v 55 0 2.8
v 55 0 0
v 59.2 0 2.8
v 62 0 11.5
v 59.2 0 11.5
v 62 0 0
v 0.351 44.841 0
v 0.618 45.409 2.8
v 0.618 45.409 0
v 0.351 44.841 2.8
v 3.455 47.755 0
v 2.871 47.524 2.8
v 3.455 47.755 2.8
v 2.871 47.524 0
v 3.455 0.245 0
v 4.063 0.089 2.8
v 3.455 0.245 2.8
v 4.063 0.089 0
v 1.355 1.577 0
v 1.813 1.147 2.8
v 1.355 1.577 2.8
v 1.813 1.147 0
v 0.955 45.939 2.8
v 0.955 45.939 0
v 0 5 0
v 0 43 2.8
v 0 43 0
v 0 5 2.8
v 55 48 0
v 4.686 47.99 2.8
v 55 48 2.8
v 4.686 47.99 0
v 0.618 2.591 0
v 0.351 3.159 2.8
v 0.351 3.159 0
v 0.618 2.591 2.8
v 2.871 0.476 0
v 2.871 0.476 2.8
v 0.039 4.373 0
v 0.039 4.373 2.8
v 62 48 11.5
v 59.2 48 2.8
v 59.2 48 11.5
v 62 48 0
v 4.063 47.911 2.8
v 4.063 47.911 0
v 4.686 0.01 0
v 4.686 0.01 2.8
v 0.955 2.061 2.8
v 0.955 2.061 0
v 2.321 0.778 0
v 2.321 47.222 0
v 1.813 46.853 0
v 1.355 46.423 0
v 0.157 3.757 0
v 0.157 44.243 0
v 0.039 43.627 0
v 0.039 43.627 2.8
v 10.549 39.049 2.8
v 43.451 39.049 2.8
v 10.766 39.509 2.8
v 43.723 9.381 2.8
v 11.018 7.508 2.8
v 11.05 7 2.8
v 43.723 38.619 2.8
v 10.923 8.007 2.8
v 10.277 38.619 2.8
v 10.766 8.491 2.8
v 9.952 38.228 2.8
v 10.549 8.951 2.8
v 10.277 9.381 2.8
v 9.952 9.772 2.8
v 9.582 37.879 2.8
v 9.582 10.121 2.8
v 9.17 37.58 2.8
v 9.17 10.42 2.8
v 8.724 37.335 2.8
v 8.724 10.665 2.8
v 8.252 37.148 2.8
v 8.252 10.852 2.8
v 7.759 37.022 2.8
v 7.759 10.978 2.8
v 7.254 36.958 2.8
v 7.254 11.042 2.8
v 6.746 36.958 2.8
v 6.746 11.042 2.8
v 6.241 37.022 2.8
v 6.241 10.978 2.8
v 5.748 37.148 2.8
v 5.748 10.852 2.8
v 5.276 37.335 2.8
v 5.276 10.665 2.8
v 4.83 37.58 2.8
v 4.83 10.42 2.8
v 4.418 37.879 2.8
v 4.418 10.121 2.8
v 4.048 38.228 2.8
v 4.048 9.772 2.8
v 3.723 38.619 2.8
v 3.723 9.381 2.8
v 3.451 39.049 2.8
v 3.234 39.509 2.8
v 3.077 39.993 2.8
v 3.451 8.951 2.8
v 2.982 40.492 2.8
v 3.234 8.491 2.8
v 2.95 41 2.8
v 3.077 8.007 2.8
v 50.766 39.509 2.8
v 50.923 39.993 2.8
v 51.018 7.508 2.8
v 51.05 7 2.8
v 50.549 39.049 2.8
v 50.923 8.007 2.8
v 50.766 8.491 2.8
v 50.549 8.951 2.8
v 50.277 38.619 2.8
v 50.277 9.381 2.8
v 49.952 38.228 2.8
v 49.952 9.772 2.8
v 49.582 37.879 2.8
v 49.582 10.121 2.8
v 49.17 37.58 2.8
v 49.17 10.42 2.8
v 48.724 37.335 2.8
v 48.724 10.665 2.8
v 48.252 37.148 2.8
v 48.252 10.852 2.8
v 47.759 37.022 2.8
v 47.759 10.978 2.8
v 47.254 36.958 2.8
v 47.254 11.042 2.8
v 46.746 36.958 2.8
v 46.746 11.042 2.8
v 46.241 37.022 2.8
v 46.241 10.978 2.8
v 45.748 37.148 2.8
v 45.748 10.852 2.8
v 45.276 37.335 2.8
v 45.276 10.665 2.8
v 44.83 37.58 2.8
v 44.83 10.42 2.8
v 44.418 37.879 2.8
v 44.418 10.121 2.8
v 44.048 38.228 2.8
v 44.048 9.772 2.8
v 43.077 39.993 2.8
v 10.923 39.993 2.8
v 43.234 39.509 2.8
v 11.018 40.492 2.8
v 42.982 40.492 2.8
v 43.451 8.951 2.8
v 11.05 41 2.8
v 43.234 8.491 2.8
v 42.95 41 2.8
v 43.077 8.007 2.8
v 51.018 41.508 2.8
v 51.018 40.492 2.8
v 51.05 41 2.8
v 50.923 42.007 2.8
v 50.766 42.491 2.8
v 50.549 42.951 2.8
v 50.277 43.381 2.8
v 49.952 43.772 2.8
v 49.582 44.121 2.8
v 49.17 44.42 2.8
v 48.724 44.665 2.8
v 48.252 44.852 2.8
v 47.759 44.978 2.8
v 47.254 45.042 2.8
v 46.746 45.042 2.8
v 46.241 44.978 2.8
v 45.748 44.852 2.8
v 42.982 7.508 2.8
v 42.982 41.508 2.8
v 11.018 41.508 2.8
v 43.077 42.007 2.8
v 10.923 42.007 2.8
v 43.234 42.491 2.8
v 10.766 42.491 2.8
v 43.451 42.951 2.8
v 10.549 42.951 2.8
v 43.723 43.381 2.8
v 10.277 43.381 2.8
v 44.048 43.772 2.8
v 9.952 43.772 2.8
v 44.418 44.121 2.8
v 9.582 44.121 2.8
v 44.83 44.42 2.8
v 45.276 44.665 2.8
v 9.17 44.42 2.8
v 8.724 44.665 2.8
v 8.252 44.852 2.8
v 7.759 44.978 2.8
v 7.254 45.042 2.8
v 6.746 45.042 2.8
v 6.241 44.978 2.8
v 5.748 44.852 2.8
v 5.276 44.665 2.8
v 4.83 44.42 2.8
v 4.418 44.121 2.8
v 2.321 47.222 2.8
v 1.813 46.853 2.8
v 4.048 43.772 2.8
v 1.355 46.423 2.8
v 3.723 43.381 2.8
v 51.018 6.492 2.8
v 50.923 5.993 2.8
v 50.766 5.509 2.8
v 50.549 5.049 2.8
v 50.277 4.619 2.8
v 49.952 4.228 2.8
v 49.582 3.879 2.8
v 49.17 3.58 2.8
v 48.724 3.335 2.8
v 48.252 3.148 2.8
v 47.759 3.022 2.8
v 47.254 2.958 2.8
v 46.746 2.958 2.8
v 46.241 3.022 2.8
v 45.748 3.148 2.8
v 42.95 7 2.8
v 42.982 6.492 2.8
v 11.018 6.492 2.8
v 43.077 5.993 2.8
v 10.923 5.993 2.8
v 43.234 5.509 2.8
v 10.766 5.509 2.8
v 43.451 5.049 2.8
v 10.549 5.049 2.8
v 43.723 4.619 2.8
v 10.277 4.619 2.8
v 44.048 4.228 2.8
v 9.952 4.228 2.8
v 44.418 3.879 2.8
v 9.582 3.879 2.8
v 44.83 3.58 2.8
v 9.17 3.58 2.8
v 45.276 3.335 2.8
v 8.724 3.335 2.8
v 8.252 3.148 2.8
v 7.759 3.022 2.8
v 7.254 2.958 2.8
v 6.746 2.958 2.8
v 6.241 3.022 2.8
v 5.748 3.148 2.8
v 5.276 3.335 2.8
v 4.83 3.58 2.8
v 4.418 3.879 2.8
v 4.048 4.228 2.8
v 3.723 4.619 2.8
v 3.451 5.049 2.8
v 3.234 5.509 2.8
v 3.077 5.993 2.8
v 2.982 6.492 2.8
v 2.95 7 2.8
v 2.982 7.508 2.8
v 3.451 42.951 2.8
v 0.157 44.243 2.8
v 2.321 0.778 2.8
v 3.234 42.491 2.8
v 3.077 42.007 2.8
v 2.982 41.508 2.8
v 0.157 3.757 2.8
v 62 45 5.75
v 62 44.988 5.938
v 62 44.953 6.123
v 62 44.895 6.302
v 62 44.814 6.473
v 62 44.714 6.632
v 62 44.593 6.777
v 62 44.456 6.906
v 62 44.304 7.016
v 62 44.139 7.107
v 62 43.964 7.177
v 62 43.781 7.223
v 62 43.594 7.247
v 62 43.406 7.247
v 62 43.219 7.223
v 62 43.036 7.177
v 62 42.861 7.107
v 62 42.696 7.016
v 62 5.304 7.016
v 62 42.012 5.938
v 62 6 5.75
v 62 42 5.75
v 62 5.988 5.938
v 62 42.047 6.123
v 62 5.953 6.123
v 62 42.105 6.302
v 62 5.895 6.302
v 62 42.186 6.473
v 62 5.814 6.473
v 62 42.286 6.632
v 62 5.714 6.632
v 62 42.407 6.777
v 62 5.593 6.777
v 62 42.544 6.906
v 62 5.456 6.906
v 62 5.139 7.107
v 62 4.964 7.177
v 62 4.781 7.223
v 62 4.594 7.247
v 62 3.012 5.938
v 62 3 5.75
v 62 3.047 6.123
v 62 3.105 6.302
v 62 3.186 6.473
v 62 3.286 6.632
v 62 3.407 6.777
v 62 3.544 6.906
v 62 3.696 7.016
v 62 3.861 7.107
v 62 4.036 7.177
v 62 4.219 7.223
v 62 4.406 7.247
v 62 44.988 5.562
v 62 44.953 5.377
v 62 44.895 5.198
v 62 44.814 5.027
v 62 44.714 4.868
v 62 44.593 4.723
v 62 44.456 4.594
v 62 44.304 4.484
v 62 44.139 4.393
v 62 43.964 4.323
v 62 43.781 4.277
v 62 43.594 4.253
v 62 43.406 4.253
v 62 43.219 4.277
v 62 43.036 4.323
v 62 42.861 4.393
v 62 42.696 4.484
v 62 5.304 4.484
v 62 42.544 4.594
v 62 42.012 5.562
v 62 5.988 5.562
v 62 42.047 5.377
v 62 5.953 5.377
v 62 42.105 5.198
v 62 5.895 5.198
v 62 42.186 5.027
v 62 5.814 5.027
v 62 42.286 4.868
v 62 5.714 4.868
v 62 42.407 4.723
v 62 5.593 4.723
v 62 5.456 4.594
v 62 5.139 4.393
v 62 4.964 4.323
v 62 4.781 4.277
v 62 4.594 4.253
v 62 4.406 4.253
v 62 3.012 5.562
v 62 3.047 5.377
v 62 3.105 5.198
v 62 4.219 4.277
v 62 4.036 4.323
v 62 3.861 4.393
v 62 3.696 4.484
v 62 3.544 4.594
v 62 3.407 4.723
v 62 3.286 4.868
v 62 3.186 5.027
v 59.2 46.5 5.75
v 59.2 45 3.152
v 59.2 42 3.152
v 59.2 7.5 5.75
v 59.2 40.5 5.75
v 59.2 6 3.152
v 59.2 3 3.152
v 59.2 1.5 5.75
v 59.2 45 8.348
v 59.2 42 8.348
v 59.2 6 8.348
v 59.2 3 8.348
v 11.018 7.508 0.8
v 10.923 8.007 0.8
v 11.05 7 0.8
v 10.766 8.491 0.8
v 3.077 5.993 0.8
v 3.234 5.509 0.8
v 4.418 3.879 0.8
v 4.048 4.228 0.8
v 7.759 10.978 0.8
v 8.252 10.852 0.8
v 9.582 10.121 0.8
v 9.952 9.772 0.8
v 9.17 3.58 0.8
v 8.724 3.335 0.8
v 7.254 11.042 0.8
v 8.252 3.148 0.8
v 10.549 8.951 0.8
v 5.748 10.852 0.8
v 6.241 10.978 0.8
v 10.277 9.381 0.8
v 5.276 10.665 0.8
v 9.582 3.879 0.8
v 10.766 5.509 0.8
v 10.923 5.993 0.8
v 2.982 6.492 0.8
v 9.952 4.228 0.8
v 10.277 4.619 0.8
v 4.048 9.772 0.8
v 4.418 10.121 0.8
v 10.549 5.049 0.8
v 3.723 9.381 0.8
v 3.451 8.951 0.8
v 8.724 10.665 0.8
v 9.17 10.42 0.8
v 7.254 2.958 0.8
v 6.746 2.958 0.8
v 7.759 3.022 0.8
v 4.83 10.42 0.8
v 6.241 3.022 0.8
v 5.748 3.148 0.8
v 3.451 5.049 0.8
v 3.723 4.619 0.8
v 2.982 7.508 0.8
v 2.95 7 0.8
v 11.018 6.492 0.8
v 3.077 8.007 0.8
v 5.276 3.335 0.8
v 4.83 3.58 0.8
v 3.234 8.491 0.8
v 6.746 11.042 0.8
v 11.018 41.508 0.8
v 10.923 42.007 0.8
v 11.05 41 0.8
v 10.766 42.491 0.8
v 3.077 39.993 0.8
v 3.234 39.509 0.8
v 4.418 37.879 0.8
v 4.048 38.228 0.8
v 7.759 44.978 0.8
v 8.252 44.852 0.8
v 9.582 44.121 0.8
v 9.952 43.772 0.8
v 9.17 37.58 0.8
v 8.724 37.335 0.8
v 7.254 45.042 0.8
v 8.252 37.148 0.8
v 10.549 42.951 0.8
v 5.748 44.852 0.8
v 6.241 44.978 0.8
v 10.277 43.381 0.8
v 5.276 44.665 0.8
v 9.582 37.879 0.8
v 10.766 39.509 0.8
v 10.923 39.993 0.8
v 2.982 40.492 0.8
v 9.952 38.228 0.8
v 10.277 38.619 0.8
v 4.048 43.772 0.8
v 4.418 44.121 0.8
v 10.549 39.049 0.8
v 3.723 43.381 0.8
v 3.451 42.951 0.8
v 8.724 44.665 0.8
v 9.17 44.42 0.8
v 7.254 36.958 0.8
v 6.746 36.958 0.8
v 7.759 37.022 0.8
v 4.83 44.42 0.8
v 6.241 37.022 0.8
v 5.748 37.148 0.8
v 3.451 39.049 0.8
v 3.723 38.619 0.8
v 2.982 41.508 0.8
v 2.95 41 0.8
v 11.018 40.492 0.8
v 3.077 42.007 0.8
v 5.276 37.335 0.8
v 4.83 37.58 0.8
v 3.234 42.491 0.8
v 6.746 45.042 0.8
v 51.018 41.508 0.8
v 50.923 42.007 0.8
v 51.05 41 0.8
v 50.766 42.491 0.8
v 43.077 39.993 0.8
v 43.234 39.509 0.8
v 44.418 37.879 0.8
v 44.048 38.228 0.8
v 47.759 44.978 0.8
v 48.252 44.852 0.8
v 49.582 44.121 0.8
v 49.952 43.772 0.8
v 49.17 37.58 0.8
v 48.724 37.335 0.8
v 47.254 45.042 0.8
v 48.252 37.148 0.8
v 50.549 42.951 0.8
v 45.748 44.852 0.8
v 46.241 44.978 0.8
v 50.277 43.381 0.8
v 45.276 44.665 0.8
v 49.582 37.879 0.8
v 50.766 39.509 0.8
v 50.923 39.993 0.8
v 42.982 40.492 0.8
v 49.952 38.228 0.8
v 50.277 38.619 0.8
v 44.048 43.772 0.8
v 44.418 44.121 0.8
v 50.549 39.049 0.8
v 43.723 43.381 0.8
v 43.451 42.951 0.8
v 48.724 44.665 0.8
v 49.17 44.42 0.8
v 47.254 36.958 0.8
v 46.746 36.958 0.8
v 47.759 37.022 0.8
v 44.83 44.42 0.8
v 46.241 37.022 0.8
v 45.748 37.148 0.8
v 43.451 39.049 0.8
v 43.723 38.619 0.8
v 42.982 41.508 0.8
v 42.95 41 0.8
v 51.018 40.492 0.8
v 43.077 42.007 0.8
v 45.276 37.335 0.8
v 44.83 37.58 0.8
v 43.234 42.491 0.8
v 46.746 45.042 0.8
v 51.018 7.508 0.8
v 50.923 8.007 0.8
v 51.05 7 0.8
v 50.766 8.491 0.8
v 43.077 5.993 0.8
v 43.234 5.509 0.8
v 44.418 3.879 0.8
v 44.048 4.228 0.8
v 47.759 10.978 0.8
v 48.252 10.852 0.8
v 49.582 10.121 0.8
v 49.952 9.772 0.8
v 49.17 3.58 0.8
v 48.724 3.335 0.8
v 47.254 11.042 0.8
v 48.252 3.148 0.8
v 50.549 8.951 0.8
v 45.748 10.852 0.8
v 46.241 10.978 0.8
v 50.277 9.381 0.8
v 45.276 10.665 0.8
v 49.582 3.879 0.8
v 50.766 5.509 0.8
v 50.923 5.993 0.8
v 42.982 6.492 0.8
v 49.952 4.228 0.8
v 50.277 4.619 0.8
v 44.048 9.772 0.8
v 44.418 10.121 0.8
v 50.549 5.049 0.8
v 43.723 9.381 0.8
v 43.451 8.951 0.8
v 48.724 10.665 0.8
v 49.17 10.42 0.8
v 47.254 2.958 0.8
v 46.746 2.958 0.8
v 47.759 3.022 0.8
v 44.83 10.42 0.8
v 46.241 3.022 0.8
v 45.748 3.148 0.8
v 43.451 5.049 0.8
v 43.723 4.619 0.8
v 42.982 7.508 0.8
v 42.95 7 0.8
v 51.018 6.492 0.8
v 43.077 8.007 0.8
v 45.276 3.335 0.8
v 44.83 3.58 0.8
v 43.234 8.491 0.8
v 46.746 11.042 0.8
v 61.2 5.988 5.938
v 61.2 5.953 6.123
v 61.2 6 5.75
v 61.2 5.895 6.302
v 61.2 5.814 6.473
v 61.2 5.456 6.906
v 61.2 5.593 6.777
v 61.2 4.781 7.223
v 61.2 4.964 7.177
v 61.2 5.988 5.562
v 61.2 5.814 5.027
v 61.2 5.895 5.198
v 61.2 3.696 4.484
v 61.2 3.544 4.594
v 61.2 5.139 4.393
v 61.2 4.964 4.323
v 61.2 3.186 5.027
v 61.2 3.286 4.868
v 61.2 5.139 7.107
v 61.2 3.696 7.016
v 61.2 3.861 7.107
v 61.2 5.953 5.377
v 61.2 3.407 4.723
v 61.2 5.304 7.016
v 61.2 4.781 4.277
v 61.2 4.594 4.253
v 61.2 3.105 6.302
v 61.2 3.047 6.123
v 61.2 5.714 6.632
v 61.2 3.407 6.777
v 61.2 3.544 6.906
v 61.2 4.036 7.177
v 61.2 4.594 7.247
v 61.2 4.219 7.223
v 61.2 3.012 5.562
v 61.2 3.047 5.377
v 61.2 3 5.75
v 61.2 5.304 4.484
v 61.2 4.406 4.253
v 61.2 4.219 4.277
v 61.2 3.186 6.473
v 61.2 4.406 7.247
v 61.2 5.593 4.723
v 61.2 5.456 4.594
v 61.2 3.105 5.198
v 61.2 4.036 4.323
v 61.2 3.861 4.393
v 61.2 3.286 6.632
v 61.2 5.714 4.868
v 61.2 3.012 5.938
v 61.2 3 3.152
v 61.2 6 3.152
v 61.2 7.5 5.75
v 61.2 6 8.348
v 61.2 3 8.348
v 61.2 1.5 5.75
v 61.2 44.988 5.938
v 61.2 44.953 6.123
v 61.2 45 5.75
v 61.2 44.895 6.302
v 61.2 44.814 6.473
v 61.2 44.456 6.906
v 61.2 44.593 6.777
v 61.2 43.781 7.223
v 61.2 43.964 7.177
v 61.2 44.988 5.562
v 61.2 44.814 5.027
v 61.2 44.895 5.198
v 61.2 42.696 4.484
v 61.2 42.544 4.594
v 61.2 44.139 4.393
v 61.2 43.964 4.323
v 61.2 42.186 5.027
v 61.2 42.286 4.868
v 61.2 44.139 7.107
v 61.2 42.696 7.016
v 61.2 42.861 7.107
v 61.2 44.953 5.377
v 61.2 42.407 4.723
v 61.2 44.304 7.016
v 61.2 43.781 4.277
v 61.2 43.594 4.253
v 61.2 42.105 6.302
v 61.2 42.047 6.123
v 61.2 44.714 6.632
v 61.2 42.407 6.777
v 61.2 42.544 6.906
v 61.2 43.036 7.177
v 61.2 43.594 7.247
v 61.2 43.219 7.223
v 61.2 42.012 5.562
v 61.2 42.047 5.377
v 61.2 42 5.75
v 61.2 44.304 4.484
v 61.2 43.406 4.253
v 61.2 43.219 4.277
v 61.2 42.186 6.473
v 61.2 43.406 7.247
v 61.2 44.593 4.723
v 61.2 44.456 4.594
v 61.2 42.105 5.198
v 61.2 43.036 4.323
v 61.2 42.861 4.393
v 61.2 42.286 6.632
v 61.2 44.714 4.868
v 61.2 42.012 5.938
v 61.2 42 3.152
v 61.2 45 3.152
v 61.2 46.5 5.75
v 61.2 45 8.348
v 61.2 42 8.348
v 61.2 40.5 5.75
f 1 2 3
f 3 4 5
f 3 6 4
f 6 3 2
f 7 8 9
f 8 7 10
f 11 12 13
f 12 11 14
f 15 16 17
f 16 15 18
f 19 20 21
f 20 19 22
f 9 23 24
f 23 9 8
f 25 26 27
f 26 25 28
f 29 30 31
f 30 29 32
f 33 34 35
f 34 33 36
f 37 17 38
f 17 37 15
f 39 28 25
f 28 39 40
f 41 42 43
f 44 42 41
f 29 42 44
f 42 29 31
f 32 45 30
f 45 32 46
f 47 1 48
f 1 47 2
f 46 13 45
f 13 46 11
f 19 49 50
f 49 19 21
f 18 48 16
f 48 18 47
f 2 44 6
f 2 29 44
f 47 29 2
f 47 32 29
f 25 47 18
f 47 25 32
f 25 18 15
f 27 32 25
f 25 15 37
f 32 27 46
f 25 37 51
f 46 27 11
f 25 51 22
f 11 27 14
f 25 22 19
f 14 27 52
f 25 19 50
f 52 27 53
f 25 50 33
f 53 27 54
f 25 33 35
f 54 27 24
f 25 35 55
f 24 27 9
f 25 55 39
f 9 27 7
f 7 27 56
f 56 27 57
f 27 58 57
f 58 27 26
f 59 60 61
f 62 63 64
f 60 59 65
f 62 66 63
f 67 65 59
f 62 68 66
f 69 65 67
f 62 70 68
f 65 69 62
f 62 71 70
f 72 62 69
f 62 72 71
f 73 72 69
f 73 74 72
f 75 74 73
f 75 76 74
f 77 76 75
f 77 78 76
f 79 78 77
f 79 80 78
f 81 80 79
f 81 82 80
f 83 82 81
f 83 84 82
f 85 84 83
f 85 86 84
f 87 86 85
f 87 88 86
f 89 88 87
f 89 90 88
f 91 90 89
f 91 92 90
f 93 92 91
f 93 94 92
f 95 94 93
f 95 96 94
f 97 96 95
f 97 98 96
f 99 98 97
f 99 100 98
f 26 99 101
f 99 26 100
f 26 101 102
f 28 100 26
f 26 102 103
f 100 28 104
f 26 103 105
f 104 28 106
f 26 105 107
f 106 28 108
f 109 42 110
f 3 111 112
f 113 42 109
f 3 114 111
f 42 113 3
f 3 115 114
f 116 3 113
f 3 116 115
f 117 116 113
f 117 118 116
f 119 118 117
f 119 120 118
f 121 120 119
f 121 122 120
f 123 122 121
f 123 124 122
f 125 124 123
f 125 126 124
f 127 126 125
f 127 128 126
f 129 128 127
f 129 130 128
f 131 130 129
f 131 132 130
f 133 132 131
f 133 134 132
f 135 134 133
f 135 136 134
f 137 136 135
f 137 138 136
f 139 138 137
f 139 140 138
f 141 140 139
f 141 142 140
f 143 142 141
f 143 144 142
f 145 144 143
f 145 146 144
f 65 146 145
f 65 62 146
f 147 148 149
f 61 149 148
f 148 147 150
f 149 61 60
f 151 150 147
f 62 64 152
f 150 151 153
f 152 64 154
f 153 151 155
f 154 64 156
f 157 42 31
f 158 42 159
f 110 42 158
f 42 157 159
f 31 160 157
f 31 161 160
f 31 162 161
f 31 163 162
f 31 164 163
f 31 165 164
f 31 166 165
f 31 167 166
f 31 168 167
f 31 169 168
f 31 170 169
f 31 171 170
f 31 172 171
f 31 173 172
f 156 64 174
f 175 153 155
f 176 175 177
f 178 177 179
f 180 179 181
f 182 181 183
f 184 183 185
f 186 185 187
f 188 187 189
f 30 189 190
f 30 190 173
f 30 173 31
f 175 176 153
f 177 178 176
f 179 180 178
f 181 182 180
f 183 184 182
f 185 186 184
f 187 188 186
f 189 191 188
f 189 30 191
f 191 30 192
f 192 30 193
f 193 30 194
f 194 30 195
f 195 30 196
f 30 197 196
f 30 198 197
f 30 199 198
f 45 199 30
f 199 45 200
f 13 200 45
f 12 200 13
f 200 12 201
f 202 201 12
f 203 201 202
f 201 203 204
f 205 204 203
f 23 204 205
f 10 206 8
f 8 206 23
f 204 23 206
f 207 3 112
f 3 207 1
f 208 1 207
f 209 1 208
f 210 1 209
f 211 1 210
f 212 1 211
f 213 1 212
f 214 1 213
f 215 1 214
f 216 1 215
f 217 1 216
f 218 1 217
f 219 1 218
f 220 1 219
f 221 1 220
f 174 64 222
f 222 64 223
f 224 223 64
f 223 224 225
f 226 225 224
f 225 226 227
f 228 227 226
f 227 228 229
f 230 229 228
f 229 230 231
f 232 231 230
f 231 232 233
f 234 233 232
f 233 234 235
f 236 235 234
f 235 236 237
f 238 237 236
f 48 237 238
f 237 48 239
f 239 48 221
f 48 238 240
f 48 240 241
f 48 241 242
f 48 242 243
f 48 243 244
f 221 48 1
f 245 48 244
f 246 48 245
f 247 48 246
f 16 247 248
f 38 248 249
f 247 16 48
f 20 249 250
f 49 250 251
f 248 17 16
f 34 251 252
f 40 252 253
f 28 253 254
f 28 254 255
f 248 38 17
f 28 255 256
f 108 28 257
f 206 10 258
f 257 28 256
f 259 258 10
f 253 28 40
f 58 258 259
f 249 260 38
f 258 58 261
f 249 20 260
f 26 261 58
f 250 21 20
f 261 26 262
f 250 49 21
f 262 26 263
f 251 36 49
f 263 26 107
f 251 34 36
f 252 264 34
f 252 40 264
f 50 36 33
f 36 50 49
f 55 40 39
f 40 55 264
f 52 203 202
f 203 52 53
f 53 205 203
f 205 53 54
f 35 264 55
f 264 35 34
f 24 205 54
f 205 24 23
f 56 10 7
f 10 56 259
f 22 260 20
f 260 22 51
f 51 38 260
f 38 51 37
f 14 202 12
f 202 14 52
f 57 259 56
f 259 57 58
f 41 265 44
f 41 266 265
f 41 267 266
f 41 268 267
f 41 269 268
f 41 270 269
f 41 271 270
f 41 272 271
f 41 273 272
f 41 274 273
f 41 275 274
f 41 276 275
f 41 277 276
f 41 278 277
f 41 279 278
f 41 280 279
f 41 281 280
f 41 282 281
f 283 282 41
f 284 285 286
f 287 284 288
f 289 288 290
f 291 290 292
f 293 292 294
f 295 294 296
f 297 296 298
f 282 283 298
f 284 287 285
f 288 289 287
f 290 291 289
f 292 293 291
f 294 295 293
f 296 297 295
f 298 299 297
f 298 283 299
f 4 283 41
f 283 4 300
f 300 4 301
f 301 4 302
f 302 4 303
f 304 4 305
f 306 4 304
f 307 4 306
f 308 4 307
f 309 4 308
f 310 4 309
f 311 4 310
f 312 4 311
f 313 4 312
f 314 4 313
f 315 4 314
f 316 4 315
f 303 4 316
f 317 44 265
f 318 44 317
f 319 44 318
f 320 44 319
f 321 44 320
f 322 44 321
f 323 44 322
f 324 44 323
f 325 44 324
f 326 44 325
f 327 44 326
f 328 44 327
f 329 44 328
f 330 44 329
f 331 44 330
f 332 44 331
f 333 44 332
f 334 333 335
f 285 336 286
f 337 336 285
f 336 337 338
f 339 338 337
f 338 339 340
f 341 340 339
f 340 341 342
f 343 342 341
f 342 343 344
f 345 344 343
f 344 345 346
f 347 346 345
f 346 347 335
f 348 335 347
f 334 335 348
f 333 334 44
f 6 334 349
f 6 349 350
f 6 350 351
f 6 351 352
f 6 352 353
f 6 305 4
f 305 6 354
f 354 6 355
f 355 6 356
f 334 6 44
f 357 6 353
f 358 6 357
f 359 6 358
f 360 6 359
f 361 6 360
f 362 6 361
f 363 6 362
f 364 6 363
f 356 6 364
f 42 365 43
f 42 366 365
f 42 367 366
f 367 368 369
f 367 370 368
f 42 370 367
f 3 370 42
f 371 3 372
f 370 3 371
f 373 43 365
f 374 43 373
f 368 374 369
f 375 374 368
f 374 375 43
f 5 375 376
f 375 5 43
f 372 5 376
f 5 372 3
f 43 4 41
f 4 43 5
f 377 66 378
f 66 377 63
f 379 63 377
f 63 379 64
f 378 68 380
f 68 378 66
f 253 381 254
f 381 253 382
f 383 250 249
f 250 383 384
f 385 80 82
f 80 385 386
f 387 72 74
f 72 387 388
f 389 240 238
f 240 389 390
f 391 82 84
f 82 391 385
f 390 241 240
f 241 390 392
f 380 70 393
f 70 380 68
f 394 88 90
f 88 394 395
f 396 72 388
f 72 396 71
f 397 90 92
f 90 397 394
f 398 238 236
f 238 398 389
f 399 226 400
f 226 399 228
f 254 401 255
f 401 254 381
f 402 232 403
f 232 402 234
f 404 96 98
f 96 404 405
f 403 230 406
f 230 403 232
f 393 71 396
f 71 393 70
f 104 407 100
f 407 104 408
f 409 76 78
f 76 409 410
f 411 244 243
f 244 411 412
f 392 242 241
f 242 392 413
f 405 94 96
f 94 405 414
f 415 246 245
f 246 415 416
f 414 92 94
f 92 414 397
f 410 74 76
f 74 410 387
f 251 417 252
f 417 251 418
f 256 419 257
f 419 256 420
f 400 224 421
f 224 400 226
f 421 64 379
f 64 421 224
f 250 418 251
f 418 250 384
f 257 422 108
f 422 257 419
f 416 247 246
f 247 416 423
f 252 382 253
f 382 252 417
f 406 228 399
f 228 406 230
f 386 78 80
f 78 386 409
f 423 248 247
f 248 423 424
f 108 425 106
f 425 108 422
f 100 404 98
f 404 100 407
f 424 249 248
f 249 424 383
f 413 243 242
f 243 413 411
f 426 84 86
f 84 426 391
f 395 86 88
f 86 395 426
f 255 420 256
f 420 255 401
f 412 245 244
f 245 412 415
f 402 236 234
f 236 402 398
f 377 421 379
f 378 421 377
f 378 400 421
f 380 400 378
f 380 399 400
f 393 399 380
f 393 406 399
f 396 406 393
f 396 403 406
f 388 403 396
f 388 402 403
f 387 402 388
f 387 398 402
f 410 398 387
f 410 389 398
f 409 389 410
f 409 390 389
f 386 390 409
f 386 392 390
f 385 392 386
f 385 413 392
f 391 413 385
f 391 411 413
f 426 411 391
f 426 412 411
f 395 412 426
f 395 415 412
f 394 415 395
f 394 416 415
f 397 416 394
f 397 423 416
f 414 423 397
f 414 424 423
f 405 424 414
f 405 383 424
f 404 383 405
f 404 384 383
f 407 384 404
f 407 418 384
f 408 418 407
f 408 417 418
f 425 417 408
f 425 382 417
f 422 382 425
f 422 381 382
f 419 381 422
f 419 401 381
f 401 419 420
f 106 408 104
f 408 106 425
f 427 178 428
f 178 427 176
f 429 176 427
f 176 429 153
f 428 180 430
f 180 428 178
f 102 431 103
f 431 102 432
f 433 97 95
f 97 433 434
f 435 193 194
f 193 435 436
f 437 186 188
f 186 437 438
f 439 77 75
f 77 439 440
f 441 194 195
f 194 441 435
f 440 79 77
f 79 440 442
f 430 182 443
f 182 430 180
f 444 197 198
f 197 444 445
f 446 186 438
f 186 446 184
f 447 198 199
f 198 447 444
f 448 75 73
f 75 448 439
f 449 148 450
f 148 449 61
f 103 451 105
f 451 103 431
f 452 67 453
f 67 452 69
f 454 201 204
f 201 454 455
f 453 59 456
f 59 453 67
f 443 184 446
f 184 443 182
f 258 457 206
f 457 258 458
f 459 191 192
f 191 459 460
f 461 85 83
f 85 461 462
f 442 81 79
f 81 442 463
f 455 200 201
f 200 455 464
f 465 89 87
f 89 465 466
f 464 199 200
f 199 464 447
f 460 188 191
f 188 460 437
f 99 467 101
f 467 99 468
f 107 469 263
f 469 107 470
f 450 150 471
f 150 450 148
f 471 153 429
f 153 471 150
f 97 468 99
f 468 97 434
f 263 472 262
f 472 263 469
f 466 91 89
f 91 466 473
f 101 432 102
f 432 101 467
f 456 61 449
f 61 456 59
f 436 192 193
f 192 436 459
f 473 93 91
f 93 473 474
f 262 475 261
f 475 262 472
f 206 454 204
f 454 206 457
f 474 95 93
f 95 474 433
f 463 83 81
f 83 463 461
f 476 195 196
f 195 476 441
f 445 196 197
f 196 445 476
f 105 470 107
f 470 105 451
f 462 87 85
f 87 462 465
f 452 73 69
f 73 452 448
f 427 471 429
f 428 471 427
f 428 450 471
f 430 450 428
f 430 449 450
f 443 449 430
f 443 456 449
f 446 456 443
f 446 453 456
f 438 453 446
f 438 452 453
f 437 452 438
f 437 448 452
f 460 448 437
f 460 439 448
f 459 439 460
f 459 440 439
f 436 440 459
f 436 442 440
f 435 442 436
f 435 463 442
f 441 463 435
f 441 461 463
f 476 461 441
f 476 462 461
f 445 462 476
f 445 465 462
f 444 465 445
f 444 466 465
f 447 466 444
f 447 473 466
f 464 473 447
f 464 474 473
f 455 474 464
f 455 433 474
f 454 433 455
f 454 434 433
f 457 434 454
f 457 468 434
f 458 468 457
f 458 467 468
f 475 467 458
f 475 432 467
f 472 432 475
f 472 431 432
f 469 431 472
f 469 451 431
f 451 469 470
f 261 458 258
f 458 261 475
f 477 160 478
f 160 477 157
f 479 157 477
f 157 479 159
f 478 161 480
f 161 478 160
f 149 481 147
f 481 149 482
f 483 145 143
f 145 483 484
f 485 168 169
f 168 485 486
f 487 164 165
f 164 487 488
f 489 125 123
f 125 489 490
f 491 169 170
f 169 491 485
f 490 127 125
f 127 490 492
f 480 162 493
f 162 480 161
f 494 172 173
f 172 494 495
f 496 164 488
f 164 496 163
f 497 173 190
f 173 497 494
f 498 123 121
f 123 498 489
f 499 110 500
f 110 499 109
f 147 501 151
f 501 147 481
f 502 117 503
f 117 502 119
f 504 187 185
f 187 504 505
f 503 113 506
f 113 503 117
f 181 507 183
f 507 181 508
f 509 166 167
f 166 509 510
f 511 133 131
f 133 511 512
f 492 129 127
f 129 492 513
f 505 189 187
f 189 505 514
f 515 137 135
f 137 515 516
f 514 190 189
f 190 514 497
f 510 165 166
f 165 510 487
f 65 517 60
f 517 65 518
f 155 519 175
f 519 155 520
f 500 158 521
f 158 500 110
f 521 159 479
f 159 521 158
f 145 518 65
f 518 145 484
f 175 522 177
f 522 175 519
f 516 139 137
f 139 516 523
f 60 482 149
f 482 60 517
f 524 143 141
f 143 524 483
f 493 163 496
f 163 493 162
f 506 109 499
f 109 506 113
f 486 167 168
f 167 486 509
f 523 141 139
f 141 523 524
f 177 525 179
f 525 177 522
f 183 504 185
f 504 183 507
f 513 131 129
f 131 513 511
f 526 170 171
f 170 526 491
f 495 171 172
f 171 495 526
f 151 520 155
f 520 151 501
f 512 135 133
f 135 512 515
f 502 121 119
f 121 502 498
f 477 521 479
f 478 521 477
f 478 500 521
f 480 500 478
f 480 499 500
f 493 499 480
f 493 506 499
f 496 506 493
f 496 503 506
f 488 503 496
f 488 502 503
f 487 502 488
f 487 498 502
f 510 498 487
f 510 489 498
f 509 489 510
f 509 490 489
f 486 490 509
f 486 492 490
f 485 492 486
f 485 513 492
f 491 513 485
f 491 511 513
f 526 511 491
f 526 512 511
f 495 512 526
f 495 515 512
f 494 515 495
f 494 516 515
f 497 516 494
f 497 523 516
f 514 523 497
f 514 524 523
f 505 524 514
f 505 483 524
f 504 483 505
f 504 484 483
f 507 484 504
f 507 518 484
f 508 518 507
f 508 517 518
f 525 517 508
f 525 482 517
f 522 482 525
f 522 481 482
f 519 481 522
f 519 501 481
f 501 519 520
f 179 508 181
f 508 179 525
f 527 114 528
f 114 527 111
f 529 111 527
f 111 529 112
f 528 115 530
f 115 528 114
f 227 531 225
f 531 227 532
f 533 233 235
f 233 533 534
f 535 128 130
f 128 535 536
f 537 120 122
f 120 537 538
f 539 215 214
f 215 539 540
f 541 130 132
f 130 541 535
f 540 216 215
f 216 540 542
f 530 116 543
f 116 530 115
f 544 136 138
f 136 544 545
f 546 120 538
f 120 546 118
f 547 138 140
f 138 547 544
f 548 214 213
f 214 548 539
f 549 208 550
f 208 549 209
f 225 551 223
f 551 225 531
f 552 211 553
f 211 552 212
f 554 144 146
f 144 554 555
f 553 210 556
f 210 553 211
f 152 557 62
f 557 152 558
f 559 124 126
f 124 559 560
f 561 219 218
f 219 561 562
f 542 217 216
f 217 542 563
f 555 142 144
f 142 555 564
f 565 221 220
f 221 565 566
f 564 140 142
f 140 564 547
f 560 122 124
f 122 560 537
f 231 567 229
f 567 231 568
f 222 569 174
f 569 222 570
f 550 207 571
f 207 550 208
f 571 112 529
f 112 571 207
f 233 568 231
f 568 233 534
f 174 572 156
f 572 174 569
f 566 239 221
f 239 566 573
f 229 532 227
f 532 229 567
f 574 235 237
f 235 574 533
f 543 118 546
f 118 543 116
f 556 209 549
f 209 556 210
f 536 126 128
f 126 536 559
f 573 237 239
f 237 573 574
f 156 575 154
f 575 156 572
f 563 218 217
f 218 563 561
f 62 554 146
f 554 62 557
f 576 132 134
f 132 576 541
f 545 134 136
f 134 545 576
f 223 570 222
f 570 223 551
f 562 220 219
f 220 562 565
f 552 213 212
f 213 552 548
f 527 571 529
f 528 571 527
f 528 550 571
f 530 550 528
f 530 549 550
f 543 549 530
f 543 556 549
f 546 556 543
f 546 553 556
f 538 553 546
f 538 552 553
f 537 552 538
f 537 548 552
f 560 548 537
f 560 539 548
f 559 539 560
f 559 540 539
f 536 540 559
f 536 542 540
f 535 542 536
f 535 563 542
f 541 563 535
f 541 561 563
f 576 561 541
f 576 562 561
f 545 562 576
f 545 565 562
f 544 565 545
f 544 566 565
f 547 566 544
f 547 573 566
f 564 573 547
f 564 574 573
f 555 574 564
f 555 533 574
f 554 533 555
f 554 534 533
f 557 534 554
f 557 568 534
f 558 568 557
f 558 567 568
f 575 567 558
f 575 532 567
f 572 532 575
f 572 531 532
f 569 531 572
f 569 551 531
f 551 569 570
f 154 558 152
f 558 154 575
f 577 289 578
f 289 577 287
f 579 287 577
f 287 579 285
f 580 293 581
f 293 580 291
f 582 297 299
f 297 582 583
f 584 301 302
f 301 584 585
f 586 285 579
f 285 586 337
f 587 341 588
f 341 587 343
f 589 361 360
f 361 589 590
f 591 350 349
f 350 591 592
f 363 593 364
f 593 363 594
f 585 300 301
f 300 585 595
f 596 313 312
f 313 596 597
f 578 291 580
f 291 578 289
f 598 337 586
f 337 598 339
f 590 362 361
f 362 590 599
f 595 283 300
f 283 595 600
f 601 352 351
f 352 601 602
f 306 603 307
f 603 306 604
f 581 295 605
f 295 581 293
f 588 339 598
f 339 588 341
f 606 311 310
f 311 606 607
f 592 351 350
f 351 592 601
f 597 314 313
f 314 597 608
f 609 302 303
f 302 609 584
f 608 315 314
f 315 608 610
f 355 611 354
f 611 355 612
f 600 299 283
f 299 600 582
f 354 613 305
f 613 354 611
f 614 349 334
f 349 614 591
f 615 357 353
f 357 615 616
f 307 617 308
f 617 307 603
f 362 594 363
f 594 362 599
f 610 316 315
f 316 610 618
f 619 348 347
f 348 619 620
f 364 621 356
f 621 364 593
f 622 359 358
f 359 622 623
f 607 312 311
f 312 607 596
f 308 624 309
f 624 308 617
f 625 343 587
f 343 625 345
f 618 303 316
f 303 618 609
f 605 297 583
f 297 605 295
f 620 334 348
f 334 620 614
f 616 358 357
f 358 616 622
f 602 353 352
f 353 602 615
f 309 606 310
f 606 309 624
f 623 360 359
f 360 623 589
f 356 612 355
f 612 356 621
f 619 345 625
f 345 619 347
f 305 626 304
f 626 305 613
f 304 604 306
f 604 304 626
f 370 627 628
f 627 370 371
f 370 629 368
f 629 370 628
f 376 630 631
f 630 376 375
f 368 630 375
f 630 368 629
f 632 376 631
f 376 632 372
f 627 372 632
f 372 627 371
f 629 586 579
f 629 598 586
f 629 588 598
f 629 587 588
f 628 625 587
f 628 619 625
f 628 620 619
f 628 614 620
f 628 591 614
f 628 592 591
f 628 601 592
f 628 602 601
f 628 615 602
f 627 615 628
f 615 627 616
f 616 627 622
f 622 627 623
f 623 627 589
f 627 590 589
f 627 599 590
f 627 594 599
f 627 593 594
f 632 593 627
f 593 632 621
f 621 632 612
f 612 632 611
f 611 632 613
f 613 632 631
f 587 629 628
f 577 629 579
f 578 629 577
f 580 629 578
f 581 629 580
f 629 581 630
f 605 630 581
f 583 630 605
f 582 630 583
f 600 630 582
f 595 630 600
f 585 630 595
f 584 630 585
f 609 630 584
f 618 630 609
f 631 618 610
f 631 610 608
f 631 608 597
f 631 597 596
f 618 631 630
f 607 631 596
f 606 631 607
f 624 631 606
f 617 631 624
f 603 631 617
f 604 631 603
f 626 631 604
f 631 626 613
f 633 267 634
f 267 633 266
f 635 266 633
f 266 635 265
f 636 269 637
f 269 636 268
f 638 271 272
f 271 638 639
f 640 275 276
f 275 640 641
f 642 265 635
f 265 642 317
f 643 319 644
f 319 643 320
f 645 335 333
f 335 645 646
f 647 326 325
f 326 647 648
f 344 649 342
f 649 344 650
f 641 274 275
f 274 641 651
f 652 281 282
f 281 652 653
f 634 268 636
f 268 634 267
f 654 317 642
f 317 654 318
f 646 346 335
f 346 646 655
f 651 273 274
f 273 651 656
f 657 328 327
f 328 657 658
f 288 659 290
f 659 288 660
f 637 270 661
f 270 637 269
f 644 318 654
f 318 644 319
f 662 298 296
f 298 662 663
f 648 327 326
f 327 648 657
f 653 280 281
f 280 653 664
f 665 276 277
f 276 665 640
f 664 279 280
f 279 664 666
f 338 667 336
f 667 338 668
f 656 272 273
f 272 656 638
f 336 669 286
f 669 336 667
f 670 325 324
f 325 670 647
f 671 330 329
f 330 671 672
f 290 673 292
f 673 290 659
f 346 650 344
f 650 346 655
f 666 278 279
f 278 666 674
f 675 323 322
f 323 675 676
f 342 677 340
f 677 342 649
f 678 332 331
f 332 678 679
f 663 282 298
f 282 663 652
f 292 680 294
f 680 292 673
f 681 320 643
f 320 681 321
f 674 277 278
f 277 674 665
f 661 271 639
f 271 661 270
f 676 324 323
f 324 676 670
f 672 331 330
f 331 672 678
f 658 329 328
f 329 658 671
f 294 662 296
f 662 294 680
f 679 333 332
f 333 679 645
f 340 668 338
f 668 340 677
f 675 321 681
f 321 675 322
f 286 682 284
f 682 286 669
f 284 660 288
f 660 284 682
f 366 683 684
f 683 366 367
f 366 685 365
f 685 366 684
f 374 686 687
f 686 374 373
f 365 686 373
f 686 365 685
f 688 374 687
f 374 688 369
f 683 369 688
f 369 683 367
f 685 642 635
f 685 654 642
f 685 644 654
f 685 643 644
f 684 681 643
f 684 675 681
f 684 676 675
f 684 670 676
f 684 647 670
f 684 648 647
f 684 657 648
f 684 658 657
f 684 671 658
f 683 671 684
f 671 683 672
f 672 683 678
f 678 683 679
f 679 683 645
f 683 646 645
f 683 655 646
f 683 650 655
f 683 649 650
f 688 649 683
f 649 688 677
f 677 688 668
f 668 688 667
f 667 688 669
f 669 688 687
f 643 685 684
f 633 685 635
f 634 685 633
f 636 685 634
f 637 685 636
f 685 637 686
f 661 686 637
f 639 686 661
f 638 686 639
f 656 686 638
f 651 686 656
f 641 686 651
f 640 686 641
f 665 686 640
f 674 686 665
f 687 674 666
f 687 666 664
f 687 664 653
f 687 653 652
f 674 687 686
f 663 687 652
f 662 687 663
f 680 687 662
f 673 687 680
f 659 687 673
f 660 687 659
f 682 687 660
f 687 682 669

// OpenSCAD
// Title:        Parametric Homematic magnet mount
// Version:      1.0.0
// Release Date: 2018-05-31
// Author:       Klaus Moser


// Variables
/////////////

/* [General] */

// mounting type
mounting_type = 1; // [0:none, 0:magnets, 1: screws]

// Wall width
wall_width = .8;


/* [Sensor] */

// Sensor width
sensor_width = 48;

// Sensor width
sensor_depth = 11.5;

// Mounting hole distance for sensor
sensor_screw_distance = 39;


/* [Mounting base] */

// Base mounting plate depth
base_width = 60;

// Corner radius
corner_radius = 5;

// Distance of the magnets/screws to the border
border_distance = 2;

// Magnets/screws x - distance divider, (total_width / this value)
distance_divider = 3;


/* [Magnets] */

// Diameter of the magnet
magnet_dimeter = 8.1; // 7.89

// Height of the magnet
magnet_height = 2; // 1.94


/* [Sensor screws] */

// Sensor screw hole diameter
sensor_screw_hole_diameter = 3;

// Nut diameter
sensor_nut_hole_diameter = 6; // 5.6

// Nut height
sensor_nut_hole_height = 2; // 1.93


/* [Mounting screws] */

// Mounting screw hole diameter
mounting_screw_hole_diameter = 3;

// Mounting screw head diameter
mounting_screw_head_diameter = 6;

// Mounting screw head height
mounting_screw_head_height = 3;


/* [Misc] */

// Resolution
$fn = 50;

// Avoid artifacts
clearance = .001;


// Calculated values
//////////////////////
total_base_height = magnet_height + wall_width;
magnet_offset = corner_radius+border_distance;
magnet_distance = base_width - base_width/distance_divider;
screw_hole_offset = (sensor_width-sensor_screw_distance) / 2;


// Build
/////////
difference() {

    // Base
    baseMount();

    // Holes for magnets
    if (mounting_type == 1) {
        translate([
            magnet_offset,
            magnet_offset,
            total_base_height-magnet_height
        ]) {
            cylinder(d=magnet_dimeter,h=magnet_height+clearance);
        }
        translate([
            magnet_offset,
            sensor_width-magnet_offset,
            total_base_height-magnet_height
        ]) {
            cylinder(d=magnet_dimeter,h=magnet_height+clearance);
        }
        translate([
            magnet_offset+magnet_distance,
            sensor_width-magnet_offset,
            total_base_height-magnet_height
        ]) {
            cylinder(d=magnet_dimeter,h=magnet_height+clearance);
        }
        translate([
            magnet_offset+magnet_distance,
            magnet_offset,
            total_base_height-magnet_height
        ]) {
            cylinder(d=magnet_dimeter,h=magnet_height+clearance);
        }
    }
    
    // Holes for screws
    if (mounting_type == 2) {

        translate_z = total_base_height-mounting_screw_head_height+clearance;

        translate([
            magnet_offset,
            magnet_offset,
            translate_z
        ]) {
            sunkScrewHole();
        }
        translate([
            magnet_offset,
            sensor_width-magnet_offset,
            translate_z
        ]) {
            sunkScrewHole();
        }
        translate([
            magnet_offset+magnet_distance,
            sensor_width-magnet_offset,
            translate_z
        ]) {
            sunkScrewHole();
        }
        translate([
            magnet_offset+magnet_distance,
            magnet_offset,
            translate_z
        ]) {
            sunkScrewHole();
        }
    }
    
    // Screw holes for sensor
    translate([base_width-wall_width-clearance,screw_hole_offset,sensor_depth/2]) {
        rotate(90, [0,1,0]) {
            screwHole();
            translate([0,sensor_screw_distance,0]) {
                screwHole();
            }
        }
    }
}


// Modules
////////////
module baseMount() {
    union() {
        roundedRectangle(base_width, sensor_width, total_base_height, corner_radius);
        translate([base_width-wall_width,0,sensor_depth]) {
            rotate(90, [0,1,0]) {
                cube([sensor_depth, sensor_width, total_base_height]);
            }
        }
    }
}
module roundedRectangle(width, depth, height, radius) {
    hull () {    
        translate([radius,radius,0]) {
            cylinder(h=height, r=radius, $fn=50);
        }
        translate([radius,depth-radius,0]) {
            cylinder(h=height, r=radius, $fn=50);
        }
        translate([width-radius,depth-radius,0]) {
            cube([radius,radius,height]);
        }
        translate([width-radius,0,0]) {
            cube([radius,radius,height]);
        }
    }
}
module screwHole() {
    rotate(90, [0,0,1]) {
        cylinder(d=sensor_screw_hole_diameter,h=total_base_height+2*clearance);
        cylinder(d=sensor_nut_hole_diameter,h=sensor_nut_hole_height+clearance, $fn=6);
    }
}

module sunkScrewHole() {
    cylinder(
        d1=mounting_screw_hole_diameter,
        d2=mounting_screw_head_diameter,
        h=mounting_screw_head_height+2*clearance
    );
    cylinder(
        d=mounting_screw_hole_diameter,
        h=mounting_screw_head_height+2*clearance
    );
}
